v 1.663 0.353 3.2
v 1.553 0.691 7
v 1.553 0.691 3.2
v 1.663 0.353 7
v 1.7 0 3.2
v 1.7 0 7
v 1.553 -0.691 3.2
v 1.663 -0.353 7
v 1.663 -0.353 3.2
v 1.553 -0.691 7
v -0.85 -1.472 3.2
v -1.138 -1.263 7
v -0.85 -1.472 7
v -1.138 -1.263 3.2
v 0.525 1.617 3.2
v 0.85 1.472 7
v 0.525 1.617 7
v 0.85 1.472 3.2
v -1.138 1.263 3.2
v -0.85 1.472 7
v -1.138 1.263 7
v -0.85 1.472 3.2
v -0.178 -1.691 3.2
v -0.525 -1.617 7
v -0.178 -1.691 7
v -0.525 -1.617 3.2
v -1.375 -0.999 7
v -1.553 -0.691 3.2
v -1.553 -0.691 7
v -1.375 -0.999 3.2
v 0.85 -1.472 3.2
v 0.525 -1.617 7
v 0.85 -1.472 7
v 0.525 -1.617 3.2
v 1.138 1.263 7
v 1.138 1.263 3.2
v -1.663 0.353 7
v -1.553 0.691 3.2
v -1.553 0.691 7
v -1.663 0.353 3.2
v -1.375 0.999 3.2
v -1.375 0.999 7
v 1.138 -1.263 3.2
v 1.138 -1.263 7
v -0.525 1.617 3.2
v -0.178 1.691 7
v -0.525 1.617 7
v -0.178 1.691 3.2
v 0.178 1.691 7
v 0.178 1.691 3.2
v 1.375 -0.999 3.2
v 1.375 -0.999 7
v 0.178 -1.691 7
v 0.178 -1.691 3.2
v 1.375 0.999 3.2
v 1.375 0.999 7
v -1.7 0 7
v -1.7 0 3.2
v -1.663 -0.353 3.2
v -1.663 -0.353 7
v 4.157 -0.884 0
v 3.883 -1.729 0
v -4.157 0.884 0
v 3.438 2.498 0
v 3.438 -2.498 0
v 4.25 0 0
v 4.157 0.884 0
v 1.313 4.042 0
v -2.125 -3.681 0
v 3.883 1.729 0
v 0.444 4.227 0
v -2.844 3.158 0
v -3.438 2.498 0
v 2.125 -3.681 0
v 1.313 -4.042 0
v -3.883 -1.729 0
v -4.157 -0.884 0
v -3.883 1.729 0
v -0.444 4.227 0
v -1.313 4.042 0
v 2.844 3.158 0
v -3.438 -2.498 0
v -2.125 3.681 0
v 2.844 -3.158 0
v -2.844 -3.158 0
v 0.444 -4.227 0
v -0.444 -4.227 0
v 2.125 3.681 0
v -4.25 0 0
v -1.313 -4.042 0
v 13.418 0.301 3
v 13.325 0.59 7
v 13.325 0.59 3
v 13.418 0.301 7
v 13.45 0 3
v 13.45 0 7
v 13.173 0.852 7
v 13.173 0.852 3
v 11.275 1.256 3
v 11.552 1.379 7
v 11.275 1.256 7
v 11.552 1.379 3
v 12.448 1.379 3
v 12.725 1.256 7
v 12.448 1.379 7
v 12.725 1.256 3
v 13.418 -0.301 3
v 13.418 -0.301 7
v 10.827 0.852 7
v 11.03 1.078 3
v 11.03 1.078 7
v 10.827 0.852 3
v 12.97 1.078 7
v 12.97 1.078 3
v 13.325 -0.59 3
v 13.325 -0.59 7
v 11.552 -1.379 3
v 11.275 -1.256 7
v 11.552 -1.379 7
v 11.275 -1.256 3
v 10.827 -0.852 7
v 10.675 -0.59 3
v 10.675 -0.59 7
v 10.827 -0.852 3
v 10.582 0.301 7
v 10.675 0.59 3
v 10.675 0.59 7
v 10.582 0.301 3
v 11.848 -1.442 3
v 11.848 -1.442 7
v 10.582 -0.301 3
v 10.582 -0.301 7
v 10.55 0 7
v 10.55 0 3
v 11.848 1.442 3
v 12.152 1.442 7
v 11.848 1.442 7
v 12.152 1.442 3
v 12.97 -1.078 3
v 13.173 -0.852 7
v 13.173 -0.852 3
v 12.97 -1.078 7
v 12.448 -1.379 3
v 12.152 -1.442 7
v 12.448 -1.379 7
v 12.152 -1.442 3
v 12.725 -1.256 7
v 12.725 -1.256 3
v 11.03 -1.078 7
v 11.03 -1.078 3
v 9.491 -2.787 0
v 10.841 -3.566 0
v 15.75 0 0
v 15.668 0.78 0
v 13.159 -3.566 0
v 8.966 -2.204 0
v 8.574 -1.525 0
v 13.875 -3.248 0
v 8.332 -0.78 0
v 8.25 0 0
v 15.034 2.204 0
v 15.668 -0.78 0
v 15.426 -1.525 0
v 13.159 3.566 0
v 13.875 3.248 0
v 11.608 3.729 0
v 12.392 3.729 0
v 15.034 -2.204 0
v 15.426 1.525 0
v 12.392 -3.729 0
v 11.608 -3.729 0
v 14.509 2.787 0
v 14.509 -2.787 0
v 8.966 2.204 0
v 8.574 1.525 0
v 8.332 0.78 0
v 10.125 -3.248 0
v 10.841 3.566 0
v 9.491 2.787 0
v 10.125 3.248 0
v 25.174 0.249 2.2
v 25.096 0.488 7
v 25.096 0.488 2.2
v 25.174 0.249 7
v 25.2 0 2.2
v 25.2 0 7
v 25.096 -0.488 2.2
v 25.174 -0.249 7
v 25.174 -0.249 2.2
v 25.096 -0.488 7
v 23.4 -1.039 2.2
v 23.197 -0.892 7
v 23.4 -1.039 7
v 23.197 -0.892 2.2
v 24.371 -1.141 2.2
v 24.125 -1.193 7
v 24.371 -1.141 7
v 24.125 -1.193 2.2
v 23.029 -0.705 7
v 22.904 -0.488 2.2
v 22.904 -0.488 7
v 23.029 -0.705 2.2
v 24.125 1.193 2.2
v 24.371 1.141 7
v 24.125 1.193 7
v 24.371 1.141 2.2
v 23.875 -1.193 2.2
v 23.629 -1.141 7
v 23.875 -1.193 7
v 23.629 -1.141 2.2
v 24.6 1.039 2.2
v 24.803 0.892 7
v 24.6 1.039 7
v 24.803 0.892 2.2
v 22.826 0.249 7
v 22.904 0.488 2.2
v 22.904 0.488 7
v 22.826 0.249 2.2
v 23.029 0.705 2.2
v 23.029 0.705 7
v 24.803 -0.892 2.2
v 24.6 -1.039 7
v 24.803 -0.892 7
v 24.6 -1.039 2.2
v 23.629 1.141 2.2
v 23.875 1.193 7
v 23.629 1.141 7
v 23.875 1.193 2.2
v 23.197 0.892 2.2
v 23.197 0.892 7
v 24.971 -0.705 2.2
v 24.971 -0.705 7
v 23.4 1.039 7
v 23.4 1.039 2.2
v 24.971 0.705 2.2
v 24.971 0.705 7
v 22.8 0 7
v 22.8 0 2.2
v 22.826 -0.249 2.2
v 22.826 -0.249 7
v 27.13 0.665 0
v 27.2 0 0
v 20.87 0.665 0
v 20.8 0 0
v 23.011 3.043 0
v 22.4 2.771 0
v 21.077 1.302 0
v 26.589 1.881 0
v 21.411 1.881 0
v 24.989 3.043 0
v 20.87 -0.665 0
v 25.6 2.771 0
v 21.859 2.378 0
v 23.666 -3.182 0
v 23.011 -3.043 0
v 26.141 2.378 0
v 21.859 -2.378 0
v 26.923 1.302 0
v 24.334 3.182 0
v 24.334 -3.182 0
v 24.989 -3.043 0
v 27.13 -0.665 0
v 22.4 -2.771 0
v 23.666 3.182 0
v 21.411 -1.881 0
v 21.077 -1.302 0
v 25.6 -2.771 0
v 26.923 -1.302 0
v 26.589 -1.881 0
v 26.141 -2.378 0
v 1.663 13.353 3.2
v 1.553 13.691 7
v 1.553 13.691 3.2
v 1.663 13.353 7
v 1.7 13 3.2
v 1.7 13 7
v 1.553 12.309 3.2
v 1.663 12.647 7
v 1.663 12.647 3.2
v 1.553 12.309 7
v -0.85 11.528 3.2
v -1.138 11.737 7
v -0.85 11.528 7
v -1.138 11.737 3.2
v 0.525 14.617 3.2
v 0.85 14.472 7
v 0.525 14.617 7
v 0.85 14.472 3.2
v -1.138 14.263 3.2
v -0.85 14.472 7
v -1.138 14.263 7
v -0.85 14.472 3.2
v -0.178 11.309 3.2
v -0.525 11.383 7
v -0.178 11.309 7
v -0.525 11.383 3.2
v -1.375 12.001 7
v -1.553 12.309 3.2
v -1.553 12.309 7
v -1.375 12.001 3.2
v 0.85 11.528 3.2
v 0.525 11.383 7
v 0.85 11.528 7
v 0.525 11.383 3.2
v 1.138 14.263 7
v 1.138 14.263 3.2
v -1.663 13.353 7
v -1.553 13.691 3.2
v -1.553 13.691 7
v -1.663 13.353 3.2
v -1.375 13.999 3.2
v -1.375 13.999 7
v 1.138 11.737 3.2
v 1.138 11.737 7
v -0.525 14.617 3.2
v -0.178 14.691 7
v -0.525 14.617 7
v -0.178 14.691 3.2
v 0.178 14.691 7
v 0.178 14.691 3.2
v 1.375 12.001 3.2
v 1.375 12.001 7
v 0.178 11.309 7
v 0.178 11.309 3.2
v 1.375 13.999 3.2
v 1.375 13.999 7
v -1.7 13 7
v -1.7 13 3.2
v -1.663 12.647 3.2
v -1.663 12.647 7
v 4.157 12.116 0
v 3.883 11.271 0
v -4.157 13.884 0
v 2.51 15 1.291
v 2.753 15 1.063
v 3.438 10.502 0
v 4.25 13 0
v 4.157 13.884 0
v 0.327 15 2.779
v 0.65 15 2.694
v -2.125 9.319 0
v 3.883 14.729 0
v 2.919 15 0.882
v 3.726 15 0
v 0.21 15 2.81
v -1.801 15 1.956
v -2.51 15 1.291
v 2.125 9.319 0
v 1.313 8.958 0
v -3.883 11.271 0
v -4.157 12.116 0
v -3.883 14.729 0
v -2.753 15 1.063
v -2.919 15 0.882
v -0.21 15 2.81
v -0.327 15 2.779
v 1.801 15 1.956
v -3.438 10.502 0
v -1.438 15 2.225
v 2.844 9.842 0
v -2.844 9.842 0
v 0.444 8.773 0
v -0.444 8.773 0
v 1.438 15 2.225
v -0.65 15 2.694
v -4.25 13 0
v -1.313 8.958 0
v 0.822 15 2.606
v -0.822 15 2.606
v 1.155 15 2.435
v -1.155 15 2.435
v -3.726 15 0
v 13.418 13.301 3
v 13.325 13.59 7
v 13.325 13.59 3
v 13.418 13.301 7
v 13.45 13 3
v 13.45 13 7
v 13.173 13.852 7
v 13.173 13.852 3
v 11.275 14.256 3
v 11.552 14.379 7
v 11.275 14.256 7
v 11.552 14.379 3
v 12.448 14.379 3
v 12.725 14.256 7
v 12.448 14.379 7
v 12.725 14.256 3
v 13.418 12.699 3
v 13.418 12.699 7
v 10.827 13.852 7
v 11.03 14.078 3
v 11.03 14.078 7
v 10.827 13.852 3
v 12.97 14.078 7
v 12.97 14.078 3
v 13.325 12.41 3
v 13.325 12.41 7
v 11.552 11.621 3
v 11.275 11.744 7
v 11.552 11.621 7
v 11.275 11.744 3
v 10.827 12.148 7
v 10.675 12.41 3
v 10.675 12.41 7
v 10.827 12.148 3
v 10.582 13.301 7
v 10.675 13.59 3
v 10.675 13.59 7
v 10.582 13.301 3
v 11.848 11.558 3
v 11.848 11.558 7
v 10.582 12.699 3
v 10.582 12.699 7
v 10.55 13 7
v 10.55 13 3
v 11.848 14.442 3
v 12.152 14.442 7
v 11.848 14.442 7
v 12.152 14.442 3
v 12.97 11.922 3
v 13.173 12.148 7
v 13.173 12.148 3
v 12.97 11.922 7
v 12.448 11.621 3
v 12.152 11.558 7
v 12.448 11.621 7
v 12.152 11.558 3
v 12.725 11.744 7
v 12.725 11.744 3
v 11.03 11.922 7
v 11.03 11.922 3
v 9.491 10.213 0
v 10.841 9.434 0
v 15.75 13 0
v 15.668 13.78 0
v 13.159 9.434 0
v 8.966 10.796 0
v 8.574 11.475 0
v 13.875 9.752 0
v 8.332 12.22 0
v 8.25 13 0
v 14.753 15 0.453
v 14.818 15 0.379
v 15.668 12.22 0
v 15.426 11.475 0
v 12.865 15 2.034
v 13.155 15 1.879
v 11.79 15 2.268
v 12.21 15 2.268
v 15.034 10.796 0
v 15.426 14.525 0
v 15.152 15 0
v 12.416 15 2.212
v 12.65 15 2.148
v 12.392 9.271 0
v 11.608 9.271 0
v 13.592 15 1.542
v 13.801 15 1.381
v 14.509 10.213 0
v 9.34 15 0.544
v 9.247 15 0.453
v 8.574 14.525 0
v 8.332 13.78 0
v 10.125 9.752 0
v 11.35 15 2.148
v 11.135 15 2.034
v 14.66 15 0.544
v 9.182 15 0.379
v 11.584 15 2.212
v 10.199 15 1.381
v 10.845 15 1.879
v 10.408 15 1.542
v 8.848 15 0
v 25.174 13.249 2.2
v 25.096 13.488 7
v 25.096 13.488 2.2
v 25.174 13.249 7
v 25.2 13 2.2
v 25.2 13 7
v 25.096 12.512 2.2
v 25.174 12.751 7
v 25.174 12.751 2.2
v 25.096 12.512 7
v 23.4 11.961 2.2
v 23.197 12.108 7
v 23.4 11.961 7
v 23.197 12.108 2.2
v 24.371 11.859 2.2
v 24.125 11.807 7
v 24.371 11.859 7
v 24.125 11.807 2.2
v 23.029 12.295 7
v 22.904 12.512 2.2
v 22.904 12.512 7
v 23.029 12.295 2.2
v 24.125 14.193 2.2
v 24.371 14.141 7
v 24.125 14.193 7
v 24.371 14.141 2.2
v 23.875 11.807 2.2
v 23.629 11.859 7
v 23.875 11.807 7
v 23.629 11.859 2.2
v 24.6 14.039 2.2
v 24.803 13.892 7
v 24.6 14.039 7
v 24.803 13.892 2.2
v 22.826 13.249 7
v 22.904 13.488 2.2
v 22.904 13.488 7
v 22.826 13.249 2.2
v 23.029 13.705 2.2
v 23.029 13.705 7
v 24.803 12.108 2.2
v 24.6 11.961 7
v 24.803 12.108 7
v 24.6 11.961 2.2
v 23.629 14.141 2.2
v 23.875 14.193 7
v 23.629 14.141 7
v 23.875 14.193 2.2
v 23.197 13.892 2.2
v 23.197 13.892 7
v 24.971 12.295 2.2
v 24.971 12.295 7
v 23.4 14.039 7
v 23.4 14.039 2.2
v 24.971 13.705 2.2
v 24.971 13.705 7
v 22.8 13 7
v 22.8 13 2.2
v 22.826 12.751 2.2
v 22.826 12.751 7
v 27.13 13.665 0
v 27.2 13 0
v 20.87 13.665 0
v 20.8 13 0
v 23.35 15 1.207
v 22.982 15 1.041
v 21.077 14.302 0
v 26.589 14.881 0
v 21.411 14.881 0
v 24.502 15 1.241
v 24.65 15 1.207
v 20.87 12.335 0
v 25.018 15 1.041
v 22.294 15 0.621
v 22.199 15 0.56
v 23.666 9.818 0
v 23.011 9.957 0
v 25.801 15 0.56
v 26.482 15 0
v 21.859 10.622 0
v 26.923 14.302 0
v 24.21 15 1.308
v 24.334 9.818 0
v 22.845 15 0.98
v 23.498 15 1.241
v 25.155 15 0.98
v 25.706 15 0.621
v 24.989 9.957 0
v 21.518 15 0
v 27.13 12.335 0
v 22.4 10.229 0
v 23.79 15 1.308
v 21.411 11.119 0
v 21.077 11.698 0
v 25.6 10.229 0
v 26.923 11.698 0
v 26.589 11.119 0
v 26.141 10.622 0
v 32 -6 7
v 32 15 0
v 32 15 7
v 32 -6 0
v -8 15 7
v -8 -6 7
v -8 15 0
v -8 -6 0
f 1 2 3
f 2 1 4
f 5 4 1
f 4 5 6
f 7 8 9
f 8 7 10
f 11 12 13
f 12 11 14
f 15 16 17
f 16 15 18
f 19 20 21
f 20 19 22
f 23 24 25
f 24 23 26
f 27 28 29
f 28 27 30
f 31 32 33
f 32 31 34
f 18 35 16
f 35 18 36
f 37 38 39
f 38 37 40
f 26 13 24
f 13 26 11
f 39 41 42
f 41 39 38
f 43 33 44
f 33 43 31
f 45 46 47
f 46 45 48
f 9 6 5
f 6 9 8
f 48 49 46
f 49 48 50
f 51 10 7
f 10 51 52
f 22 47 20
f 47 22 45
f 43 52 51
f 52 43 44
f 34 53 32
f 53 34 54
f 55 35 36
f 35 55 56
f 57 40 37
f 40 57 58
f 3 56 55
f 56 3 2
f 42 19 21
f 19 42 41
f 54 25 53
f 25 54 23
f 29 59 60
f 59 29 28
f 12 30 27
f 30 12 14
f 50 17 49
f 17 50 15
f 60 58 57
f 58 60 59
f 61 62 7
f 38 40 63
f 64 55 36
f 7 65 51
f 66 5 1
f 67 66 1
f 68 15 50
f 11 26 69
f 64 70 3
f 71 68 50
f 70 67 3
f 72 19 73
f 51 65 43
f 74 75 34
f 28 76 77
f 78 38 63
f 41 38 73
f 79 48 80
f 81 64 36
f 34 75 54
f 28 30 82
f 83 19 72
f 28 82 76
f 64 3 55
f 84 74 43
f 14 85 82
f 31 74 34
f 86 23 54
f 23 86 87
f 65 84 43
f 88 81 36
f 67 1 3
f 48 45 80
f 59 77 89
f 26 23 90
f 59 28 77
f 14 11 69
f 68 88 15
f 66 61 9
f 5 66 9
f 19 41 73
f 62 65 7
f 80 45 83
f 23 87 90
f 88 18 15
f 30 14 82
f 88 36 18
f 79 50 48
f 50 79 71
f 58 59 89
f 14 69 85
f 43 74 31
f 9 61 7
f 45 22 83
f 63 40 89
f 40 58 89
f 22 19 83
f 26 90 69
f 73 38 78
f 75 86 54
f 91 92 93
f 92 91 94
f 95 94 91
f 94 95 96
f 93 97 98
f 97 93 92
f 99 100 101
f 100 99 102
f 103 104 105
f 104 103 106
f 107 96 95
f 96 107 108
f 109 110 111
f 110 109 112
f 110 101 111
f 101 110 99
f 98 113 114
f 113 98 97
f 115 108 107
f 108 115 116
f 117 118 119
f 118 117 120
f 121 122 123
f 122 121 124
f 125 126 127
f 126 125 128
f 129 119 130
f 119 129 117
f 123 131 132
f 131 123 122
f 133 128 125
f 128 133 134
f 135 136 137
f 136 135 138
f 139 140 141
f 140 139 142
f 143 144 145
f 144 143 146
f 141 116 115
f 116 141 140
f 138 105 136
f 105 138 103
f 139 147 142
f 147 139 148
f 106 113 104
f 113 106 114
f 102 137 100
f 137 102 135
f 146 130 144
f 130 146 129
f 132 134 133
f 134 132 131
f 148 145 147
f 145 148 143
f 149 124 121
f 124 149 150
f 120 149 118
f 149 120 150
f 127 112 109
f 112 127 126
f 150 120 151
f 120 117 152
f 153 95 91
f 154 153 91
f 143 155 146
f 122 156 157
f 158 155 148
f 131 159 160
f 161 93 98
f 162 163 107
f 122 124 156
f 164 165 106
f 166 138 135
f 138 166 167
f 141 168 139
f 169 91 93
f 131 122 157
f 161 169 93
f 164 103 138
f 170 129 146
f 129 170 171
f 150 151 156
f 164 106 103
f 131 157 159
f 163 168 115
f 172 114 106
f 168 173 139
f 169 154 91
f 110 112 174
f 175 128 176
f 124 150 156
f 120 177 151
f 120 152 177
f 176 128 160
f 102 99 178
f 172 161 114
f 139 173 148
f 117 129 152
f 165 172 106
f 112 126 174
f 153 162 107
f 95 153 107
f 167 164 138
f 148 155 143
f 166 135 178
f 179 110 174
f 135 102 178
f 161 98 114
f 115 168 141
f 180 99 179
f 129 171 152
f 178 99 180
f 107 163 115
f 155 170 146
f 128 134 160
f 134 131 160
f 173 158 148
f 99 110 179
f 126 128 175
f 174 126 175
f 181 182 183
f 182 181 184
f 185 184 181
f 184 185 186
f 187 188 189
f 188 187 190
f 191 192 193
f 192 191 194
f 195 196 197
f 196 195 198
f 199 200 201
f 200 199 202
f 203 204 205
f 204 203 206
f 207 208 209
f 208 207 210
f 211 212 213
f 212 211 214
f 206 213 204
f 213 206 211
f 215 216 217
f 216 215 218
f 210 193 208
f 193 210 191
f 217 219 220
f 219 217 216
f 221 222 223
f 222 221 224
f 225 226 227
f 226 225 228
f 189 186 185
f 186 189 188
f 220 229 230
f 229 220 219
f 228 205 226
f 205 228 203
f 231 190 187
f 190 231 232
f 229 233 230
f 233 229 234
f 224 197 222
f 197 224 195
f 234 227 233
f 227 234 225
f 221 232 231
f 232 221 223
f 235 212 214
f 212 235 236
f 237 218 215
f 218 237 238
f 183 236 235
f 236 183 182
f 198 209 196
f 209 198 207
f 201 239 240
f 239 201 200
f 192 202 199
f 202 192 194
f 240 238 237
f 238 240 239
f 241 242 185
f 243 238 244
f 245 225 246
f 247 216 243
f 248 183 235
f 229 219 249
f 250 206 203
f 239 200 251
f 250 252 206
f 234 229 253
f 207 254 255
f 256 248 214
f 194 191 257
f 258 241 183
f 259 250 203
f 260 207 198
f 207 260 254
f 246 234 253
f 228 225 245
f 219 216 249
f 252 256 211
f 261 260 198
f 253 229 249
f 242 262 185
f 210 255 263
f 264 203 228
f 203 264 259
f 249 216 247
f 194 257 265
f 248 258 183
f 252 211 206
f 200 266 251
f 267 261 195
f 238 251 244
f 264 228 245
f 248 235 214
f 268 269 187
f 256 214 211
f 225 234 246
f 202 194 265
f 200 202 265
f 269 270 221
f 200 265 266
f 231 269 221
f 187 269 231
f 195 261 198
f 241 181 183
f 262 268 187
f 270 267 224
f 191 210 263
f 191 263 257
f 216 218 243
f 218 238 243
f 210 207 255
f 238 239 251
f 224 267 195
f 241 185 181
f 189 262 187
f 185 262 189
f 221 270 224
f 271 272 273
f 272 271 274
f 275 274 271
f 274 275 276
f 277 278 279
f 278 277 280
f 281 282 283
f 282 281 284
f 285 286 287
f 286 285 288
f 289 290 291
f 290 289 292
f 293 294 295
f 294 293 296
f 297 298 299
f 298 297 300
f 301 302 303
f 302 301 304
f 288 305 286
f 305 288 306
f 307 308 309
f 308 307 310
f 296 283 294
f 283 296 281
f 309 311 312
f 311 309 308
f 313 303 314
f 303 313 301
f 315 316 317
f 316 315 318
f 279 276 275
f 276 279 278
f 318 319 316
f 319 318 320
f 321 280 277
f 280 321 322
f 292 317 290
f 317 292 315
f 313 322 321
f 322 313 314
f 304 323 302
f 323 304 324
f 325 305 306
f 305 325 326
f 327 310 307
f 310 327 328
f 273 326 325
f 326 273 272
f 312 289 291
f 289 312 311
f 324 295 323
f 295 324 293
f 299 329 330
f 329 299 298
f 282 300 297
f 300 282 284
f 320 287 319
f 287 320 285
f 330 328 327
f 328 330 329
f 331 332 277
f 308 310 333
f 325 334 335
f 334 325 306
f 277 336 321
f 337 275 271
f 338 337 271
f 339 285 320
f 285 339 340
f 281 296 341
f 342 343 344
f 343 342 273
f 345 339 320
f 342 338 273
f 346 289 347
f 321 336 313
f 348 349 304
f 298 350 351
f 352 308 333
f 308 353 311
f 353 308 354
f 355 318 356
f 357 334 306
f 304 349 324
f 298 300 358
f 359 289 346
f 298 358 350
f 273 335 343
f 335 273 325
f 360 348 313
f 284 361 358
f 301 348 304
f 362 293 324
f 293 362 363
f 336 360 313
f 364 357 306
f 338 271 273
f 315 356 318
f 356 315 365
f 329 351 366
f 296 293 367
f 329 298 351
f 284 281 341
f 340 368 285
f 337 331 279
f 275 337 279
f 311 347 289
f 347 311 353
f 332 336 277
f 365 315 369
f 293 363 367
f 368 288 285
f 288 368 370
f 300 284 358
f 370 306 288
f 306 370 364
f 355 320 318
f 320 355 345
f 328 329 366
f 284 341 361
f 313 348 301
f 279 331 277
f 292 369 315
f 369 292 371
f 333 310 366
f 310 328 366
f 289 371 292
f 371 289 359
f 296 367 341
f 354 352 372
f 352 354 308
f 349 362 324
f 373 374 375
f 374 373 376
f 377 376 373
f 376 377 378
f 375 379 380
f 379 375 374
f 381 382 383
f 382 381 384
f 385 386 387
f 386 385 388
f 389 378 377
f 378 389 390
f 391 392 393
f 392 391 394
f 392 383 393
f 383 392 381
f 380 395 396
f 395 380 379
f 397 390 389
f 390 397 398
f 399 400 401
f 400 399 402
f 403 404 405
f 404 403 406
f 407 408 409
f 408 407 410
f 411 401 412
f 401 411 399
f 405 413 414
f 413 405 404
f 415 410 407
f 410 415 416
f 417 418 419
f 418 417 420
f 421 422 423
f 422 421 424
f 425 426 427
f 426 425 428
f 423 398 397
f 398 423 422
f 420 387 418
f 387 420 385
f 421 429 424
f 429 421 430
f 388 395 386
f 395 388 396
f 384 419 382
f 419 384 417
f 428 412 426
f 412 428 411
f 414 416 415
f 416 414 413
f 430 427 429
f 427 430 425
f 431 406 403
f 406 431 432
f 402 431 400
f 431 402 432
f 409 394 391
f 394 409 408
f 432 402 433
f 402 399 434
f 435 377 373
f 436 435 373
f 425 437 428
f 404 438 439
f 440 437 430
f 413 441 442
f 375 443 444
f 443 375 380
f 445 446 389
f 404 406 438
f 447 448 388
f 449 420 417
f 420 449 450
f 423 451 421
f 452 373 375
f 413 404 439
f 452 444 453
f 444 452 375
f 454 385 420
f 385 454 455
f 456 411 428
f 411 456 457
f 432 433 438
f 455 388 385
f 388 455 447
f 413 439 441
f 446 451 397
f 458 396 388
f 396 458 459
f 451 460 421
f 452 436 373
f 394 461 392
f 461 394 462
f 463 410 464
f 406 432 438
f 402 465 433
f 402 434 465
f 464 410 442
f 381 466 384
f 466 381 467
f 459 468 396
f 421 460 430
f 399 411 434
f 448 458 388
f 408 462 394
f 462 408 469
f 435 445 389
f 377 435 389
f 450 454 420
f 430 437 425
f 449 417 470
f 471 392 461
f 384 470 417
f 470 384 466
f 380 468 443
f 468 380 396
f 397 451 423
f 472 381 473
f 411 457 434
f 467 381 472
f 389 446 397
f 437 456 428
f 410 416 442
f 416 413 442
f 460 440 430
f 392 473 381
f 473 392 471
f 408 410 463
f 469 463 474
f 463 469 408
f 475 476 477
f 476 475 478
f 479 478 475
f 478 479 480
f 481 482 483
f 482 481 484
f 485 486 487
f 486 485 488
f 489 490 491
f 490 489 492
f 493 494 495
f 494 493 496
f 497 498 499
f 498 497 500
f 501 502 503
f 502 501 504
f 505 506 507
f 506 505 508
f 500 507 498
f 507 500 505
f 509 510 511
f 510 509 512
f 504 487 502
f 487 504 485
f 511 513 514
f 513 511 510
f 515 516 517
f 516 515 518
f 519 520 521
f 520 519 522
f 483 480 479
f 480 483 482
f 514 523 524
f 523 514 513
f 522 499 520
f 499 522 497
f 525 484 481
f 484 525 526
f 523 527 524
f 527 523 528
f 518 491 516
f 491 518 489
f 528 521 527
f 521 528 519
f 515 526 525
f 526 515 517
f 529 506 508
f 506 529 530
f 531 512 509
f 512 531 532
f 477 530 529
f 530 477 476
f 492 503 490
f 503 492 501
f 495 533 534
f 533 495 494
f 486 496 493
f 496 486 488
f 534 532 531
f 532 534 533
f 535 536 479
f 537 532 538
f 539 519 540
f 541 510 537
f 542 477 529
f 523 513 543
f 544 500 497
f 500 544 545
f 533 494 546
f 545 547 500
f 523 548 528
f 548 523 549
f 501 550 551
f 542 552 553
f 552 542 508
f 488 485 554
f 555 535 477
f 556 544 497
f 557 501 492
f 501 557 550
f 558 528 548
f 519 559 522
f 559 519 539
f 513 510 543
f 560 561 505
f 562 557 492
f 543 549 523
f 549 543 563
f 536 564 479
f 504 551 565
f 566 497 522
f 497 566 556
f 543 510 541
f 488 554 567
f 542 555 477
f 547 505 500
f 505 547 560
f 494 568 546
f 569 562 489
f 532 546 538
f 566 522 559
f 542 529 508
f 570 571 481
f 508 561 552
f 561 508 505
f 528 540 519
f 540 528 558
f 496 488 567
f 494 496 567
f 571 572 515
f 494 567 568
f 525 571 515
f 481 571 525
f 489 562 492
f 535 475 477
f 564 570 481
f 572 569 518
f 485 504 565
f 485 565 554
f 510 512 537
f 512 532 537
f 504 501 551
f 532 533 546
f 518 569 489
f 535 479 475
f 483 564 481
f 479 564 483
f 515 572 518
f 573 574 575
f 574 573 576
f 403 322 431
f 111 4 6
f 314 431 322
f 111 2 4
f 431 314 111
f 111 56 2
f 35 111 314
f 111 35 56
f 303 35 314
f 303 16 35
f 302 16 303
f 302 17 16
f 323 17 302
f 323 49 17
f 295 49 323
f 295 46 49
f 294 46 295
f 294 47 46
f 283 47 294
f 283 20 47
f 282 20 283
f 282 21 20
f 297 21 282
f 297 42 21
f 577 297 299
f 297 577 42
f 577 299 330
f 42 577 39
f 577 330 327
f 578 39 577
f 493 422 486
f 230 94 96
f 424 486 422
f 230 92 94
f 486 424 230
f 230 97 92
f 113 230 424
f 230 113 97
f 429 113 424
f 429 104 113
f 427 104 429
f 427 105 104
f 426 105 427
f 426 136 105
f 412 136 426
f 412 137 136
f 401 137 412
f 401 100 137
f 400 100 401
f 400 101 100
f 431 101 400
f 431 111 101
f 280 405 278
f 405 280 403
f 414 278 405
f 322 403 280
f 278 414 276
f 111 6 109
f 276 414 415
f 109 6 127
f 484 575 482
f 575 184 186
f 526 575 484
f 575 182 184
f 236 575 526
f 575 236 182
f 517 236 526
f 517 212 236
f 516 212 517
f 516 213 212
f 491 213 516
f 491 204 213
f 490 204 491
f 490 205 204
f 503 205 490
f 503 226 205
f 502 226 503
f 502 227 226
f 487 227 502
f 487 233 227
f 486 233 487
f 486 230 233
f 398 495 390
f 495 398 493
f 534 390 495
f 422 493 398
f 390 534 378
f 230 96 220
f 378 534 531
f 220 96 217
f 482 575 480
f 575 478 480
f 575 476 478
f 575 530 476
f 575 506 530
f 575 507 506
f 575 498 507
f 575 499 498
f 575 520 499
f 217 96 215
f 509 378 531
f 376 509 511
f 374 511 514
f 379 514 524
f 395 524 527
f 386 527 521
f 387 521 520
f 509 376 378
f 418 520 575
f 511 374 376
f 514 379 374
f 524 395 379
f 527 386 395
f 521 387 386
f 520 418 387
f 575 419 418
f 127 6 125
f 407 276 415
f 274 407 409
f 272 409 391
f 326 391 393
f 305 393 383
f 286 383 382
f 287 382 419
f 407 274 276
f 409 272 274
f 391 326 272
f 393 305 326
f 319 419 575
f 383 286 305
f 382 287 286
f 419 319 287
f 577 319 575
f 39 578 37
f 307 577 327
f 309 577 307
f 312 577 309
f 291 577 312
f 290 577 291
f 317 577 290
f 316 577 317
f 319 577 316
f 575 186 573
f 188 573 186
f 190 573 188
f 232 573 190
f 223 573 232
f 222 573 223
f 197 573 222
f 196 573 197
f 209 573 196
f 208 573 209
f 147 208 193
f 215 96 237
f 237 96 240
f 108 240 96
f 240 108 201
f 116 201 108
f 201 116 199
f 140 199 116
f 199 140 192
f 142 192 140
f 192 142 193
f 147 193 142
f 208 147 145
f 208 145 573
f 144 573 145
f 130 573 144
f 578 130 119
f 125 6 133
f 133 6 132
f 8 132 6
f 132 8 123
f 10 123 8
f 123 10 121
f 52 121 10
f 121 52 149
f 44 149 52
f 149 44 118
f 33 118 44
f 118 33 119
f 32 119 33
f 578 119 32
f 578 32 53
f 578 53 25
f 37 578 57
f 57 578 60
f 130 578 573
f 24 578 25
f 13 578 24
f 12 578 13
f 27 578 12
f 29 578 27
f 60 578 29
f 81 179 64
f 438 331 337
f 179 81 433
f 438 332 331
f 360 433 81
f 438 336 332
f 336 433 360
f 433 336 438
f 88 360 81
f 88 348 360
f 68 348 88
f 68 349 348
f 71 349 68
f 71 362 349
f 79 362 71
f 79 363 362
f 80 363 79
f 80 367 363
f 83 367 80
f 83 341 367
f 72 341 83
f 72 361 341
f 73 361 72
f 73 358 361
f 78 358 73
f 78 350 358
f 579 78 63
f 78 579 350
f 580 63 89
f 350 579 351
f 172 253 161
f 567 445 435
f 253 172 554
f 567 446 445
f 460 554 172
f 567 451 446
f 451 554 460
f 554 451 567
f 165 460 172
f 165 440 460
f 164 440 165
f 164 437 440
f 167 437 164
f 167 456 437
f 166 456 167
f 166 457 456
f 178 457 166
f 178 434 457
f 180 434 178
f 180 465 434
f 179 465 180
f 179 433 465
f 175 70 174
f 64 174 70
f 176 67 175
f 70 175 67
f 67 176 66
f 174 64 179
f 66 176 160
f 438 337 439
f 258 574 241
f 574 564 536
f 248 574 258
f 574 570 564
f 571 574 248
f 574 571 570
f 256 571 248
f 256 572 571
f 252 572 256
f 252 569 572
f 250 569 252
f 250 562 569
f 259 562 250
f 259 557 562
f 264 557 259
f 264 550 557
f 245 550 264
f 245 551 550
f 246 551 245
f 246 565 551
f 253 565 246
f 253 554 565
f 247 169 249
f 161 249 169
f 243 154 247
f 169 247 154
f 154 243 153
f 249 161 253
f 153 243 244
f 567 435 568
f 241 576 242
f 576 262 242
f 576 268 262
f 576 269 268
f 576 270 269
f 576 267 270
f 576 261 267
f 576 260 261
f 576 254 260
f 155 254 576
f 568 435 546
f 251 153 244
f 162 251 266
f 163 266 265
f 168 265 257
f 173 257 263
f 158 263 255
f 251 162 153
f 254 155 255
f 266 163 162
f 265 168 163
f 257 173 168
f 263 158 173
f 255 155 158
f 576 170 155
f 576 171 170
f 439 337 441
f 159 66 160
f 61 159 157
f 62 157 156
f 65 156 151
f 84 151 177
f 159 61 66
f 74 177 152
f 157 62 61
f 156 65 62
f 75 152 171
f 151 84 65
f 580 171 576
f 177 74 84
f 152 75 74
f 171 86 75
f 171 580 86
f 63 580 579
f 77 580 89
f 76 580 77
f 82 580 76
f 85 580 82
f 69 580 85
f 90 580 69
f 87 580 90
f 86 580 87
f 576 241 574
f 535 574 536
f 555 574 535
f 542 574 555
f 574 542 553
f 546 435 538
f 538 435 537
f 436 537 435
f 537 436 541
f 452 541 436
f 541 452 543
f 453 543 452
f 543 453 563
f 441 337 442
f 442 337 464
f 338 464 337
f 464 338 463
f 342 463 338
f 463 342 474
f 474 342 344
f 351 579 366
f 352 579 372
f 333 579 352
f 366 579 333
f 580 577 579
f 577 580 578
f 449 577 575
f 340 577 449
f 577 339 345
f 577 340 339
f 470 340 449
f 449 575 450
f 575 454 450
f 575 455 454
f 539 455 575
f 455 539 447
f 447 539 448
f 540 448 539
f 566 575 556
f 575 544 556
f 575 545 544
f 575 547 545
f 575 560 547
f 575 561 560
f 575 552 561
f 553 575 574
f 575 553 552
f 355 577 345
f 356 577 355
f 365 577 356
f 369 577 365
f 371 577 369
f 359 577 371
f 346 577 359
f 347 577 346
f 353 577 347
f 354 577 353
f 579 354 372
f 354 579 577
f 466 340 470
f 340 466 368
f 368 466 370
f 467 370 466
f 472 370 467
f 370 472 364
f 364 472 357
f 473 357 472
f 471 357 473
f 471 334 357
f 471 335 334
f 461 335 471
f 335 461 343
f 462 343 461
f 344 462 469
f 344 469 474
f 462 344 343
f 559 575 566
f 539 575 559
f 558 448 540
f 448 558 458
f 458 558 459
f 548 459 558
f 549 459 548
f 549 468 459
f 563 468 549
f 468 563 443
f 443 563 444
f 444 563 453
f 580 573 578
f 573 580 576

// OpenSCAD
$fn = 30;

module otvorVrut(dlzka, priemer, hlavaPriemer, hlavaVyska, zapustenie=2) {
    union() {
        cylinder(h = dlzka, d = priemer);
        cylinder(h = hlavaVyska, d1 = hlavaPriemer, d2 = priemer);
        translate([0,0,-zapustenie]) cylinder(h = zapustenie, d = hlavaPriemer);
    }
}

module otvorVrut4mm(dlzka = 20, zapustenie=2) {
    otvorVrut(dlzka, priemer = 3.4, hlavaPriemer = 8.5, hlavaVyska = 3.2, zapustenie=zapustenie);
}

module otvorVrut3_5mm(dlzka = 20, zapustenie=2) {
    otvorVrut(dlzka, priemer = 2.9, hlavaPriemer = 7.5, hlavaVyska = 3, zapustenie=zapustenie);
}

module otvorVrut3mm(dlzka = 20, zapustenie=2) {
    otvorVrut(dlzka, priemer = 2.4, hlavaPriemer = 6.4, hlavaVyska = 2.2, zapustenie=zapustenie);
}

module testBlok() {
    difference() {
        translate([-8,-6,0]) cube([40,21,7]);

        translate([0,13,0]) union() {
            otvorVrut4mm();
            translate([12, 0, 0]) otvorVrut3_5mm();
            translate([24, 0, 0]) otvorVrut3mm();

        }

        union() {
            otvorVrut4mm();
            translate([12, 0, 0]) otvorVrut3_5mm();
            translate([24, 0, 0]) otvorVrut3mm();
        }
    }
}

testBlok();
